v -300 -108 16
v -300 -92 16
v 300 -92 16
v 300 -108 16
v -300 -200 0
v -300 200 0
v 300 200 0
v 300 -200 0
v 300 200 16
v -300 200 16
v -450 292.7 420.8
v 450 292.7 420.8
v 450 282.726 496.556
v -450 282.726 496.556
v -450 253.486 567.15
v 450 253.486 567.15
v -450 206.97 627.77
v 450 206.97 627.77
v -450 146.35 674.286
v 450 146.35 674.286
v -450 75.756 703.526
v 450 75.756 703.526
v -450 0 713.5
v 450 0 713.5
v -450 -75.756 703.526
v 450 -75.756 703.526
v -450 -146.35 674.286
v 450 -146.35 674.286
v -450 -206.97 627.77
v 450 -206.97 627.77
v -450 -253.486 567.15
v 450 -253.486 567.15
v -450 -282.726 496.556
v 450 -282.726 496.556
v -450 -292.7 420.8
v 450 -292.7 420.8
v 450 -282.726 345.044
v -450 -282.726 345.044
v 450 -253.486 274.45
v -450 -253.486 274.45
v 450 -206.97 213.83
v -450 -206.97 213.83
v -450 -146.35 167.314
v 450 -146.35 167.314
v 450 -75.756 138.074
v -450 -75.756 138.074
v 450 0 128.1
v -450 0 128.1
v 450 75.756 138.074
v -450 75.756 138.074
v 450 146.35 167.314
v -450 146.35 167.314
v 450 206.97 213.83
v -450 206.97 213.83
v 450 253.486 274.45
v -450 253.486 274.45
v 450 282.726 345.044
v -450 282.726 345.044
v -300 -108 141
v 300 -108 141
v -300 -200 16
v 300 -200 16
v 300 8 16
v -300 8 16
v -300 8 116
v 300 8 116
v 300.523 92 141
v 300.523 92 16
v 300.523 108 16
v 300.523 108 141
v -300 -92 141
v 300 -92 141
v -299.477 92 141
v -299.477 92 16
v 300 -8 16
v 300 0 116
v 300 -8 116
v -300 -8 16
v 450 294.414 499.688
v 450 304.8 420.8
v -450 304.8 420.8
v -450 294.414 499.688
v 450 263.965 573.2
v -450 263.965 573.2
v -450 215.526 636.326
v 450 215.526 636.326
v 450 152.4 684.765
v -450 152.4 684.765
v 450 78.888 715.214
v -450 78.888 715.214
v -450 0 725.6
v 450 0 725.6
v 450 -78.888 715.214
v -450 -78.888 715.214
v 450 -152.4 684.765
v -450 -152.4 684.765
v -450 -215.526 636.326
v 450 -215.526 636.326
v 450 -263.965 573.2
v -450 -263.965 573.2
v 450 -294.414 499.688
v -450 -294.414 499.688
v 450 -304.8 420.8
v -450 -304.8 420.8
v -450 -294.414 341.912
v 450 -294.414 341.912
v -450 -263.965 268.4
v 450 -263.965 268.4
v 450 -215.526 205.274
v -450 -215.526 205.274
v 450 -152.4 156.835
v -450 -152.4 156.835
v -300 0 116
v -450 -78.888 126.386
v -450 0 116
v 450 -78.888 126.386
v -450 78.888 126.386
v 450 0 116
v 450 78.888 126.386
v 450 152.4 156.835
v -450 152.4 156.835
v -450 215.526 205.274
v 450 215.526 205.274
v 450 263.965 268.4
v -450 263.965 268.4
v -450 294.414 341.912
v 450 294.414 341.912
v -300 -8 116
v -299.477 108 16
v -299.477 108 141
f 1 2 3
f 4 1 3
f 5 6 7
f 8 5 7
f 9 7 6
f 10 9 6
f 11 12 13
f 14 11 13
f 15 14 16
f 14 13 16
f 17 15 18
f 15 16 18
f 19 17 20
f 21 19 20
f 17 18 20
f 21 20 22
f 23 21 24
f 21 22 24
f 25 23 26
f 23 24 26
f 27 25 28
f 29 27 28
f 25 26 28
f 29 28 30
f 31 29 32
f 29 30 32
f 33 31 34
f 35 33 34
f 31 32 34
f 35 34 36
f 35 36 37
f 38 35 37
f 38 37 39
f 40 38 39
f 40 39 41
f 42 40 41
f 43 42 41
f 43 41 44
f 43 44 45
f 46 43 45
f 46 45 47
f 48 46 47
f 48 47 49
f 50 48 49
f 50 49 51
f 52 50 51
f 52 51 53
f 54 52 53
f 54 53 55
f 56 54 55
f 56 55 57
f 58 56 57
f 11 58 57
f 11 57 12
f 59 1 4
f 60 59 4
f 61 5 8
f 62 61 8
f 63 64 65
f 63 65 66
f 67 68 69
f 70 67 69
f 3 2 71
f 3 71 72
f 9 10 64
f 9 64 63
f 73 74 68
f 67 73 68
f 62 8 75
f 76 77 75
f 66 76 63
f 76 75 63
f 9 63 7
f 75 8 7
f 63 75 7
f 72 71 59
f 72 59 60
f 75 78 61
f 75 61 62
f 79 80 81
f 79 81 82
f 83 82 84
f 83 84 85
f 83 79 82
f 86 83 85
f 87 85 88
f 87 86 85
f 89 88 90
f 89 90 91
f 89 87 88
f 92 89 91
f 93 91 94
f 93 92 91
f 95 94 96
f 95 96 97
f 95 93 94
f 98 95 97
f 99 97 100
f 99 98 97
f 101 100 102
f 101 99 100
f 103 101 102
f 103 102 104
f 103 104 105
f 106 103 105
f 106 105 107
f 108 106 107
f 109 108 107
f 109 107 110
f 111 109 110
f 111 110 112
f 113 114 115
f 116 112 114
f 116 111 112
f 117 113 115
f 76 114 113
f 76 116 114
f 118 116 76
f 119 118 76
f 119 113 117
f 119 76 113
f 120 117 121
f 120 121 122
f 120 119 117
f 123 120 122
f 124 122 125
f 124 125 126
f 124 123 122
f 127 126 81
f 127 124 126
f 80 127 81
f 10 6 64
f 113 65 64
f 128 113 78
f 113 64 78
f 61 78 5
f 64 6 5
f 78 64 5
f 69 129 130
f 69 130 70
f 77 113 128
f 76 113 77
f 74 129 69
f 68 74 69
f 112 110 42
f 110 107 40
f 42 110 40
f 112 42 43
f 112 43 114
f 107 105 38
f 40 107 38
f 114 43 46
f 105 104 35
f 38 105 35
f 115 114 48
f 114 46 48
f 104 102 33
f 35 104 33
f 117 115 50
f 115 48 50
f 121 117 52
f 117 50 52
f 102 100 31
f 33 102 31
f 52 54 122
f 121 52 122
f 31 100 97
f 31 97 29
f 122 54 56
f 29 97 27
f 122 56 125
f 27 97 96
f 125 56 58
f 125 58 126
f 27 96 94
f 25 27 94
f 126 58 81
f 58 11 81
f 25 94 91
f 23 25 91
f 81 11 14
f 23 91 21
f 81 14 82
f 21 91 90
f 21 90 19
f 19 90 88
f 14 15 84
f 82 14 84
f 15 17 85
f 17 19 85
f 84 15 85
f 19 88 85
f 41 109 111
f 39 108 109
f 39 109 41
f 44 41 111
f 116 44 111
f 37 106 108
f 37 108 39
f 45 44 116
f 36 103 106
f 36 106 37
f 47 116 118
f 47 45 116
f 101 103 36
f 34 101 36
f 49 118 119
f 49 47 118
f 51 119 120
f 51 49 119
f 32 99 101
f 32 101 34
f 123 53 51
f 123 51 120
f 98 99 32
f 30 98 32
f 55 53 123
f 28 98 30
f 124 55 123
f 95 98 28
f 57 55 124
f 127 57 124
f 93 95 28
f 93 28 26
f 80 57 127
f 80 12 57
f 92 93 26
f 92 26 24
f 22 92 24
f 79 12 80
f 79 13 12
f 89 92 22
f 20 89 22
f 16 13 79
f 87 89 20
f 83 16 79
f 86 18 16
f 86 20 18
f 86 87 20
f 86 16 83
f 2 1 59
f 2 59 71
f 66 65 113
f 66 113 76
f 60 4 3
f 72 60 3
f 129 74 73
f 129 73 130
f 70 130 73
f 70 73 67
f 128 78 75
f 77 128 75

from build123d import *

# Parameters (mm, degrees)
F1_DEPTH  = 16
F2_W      = 600
F2_H      = 16
F4_DEPTH  = 100
F5_R      = 304.8
F6_DEPTH  = 450
F7_R      = 292.7
F8_DEPTH  = 900.001
F9_W      = 600
F9_H      = 16
F10_DEPTH = 125
F3_W      = 600
F3_H      = 16
F11_DEPTH = 125


with BuildPart() as f1:
    # F0 (on Top) → F1 (new body)
    with BuildSketch(Plane.XY):
        Polygon((0, 200), (-300, 200), (-300, -200), (300, -200), (300, 200), align=None)
    extrude(amount=F1_DEPTH)

    # F2 (on face) → F4 (join)
    with BuildSketch(Plane.XY.offset(16)):
        Rectangle(F2_W, F2_H)
    extrude(amount=F4_DEPTH)

    # F5 (on Right) → F6 (join, symmetric)
    with BuildSketch(Plane.YZ):
        with Locations((0, 420.8)):
            Circle(F5_R)
    extrude(amount=F6_DEPTH, both=True)

    # F7 (on face) → F8 (cut, through all)
    with BuildSketch(Plane.YZ.offset(450)):
        with Locations((0, 420.8)):
            Circle(F7_R)
    extrude(amount=-F8_DEPTH, mode=Mode.SUBTRACT)


with BuildPart() as f10:
    # F9 (on face) → F10 (new body)
    with BuildSketch(Plane.XY.offset(16)):
        with Locations((0, -100)):
            Rectangle(F9_W, F9_H)
    extrude(amount=F10_DEPTH)


with BuildPart() as f11:
    # F3 (on face) → F11 (new body)
    with BuildSketch(Plane.XY.offset(16)):
        with Locations((0.522536, 100)):
            Rectangle(F3_W, F3_H)
    extrude(amount=F11_DEPTH)


solid = Compound([f1.part, f10.part, f11.part])
